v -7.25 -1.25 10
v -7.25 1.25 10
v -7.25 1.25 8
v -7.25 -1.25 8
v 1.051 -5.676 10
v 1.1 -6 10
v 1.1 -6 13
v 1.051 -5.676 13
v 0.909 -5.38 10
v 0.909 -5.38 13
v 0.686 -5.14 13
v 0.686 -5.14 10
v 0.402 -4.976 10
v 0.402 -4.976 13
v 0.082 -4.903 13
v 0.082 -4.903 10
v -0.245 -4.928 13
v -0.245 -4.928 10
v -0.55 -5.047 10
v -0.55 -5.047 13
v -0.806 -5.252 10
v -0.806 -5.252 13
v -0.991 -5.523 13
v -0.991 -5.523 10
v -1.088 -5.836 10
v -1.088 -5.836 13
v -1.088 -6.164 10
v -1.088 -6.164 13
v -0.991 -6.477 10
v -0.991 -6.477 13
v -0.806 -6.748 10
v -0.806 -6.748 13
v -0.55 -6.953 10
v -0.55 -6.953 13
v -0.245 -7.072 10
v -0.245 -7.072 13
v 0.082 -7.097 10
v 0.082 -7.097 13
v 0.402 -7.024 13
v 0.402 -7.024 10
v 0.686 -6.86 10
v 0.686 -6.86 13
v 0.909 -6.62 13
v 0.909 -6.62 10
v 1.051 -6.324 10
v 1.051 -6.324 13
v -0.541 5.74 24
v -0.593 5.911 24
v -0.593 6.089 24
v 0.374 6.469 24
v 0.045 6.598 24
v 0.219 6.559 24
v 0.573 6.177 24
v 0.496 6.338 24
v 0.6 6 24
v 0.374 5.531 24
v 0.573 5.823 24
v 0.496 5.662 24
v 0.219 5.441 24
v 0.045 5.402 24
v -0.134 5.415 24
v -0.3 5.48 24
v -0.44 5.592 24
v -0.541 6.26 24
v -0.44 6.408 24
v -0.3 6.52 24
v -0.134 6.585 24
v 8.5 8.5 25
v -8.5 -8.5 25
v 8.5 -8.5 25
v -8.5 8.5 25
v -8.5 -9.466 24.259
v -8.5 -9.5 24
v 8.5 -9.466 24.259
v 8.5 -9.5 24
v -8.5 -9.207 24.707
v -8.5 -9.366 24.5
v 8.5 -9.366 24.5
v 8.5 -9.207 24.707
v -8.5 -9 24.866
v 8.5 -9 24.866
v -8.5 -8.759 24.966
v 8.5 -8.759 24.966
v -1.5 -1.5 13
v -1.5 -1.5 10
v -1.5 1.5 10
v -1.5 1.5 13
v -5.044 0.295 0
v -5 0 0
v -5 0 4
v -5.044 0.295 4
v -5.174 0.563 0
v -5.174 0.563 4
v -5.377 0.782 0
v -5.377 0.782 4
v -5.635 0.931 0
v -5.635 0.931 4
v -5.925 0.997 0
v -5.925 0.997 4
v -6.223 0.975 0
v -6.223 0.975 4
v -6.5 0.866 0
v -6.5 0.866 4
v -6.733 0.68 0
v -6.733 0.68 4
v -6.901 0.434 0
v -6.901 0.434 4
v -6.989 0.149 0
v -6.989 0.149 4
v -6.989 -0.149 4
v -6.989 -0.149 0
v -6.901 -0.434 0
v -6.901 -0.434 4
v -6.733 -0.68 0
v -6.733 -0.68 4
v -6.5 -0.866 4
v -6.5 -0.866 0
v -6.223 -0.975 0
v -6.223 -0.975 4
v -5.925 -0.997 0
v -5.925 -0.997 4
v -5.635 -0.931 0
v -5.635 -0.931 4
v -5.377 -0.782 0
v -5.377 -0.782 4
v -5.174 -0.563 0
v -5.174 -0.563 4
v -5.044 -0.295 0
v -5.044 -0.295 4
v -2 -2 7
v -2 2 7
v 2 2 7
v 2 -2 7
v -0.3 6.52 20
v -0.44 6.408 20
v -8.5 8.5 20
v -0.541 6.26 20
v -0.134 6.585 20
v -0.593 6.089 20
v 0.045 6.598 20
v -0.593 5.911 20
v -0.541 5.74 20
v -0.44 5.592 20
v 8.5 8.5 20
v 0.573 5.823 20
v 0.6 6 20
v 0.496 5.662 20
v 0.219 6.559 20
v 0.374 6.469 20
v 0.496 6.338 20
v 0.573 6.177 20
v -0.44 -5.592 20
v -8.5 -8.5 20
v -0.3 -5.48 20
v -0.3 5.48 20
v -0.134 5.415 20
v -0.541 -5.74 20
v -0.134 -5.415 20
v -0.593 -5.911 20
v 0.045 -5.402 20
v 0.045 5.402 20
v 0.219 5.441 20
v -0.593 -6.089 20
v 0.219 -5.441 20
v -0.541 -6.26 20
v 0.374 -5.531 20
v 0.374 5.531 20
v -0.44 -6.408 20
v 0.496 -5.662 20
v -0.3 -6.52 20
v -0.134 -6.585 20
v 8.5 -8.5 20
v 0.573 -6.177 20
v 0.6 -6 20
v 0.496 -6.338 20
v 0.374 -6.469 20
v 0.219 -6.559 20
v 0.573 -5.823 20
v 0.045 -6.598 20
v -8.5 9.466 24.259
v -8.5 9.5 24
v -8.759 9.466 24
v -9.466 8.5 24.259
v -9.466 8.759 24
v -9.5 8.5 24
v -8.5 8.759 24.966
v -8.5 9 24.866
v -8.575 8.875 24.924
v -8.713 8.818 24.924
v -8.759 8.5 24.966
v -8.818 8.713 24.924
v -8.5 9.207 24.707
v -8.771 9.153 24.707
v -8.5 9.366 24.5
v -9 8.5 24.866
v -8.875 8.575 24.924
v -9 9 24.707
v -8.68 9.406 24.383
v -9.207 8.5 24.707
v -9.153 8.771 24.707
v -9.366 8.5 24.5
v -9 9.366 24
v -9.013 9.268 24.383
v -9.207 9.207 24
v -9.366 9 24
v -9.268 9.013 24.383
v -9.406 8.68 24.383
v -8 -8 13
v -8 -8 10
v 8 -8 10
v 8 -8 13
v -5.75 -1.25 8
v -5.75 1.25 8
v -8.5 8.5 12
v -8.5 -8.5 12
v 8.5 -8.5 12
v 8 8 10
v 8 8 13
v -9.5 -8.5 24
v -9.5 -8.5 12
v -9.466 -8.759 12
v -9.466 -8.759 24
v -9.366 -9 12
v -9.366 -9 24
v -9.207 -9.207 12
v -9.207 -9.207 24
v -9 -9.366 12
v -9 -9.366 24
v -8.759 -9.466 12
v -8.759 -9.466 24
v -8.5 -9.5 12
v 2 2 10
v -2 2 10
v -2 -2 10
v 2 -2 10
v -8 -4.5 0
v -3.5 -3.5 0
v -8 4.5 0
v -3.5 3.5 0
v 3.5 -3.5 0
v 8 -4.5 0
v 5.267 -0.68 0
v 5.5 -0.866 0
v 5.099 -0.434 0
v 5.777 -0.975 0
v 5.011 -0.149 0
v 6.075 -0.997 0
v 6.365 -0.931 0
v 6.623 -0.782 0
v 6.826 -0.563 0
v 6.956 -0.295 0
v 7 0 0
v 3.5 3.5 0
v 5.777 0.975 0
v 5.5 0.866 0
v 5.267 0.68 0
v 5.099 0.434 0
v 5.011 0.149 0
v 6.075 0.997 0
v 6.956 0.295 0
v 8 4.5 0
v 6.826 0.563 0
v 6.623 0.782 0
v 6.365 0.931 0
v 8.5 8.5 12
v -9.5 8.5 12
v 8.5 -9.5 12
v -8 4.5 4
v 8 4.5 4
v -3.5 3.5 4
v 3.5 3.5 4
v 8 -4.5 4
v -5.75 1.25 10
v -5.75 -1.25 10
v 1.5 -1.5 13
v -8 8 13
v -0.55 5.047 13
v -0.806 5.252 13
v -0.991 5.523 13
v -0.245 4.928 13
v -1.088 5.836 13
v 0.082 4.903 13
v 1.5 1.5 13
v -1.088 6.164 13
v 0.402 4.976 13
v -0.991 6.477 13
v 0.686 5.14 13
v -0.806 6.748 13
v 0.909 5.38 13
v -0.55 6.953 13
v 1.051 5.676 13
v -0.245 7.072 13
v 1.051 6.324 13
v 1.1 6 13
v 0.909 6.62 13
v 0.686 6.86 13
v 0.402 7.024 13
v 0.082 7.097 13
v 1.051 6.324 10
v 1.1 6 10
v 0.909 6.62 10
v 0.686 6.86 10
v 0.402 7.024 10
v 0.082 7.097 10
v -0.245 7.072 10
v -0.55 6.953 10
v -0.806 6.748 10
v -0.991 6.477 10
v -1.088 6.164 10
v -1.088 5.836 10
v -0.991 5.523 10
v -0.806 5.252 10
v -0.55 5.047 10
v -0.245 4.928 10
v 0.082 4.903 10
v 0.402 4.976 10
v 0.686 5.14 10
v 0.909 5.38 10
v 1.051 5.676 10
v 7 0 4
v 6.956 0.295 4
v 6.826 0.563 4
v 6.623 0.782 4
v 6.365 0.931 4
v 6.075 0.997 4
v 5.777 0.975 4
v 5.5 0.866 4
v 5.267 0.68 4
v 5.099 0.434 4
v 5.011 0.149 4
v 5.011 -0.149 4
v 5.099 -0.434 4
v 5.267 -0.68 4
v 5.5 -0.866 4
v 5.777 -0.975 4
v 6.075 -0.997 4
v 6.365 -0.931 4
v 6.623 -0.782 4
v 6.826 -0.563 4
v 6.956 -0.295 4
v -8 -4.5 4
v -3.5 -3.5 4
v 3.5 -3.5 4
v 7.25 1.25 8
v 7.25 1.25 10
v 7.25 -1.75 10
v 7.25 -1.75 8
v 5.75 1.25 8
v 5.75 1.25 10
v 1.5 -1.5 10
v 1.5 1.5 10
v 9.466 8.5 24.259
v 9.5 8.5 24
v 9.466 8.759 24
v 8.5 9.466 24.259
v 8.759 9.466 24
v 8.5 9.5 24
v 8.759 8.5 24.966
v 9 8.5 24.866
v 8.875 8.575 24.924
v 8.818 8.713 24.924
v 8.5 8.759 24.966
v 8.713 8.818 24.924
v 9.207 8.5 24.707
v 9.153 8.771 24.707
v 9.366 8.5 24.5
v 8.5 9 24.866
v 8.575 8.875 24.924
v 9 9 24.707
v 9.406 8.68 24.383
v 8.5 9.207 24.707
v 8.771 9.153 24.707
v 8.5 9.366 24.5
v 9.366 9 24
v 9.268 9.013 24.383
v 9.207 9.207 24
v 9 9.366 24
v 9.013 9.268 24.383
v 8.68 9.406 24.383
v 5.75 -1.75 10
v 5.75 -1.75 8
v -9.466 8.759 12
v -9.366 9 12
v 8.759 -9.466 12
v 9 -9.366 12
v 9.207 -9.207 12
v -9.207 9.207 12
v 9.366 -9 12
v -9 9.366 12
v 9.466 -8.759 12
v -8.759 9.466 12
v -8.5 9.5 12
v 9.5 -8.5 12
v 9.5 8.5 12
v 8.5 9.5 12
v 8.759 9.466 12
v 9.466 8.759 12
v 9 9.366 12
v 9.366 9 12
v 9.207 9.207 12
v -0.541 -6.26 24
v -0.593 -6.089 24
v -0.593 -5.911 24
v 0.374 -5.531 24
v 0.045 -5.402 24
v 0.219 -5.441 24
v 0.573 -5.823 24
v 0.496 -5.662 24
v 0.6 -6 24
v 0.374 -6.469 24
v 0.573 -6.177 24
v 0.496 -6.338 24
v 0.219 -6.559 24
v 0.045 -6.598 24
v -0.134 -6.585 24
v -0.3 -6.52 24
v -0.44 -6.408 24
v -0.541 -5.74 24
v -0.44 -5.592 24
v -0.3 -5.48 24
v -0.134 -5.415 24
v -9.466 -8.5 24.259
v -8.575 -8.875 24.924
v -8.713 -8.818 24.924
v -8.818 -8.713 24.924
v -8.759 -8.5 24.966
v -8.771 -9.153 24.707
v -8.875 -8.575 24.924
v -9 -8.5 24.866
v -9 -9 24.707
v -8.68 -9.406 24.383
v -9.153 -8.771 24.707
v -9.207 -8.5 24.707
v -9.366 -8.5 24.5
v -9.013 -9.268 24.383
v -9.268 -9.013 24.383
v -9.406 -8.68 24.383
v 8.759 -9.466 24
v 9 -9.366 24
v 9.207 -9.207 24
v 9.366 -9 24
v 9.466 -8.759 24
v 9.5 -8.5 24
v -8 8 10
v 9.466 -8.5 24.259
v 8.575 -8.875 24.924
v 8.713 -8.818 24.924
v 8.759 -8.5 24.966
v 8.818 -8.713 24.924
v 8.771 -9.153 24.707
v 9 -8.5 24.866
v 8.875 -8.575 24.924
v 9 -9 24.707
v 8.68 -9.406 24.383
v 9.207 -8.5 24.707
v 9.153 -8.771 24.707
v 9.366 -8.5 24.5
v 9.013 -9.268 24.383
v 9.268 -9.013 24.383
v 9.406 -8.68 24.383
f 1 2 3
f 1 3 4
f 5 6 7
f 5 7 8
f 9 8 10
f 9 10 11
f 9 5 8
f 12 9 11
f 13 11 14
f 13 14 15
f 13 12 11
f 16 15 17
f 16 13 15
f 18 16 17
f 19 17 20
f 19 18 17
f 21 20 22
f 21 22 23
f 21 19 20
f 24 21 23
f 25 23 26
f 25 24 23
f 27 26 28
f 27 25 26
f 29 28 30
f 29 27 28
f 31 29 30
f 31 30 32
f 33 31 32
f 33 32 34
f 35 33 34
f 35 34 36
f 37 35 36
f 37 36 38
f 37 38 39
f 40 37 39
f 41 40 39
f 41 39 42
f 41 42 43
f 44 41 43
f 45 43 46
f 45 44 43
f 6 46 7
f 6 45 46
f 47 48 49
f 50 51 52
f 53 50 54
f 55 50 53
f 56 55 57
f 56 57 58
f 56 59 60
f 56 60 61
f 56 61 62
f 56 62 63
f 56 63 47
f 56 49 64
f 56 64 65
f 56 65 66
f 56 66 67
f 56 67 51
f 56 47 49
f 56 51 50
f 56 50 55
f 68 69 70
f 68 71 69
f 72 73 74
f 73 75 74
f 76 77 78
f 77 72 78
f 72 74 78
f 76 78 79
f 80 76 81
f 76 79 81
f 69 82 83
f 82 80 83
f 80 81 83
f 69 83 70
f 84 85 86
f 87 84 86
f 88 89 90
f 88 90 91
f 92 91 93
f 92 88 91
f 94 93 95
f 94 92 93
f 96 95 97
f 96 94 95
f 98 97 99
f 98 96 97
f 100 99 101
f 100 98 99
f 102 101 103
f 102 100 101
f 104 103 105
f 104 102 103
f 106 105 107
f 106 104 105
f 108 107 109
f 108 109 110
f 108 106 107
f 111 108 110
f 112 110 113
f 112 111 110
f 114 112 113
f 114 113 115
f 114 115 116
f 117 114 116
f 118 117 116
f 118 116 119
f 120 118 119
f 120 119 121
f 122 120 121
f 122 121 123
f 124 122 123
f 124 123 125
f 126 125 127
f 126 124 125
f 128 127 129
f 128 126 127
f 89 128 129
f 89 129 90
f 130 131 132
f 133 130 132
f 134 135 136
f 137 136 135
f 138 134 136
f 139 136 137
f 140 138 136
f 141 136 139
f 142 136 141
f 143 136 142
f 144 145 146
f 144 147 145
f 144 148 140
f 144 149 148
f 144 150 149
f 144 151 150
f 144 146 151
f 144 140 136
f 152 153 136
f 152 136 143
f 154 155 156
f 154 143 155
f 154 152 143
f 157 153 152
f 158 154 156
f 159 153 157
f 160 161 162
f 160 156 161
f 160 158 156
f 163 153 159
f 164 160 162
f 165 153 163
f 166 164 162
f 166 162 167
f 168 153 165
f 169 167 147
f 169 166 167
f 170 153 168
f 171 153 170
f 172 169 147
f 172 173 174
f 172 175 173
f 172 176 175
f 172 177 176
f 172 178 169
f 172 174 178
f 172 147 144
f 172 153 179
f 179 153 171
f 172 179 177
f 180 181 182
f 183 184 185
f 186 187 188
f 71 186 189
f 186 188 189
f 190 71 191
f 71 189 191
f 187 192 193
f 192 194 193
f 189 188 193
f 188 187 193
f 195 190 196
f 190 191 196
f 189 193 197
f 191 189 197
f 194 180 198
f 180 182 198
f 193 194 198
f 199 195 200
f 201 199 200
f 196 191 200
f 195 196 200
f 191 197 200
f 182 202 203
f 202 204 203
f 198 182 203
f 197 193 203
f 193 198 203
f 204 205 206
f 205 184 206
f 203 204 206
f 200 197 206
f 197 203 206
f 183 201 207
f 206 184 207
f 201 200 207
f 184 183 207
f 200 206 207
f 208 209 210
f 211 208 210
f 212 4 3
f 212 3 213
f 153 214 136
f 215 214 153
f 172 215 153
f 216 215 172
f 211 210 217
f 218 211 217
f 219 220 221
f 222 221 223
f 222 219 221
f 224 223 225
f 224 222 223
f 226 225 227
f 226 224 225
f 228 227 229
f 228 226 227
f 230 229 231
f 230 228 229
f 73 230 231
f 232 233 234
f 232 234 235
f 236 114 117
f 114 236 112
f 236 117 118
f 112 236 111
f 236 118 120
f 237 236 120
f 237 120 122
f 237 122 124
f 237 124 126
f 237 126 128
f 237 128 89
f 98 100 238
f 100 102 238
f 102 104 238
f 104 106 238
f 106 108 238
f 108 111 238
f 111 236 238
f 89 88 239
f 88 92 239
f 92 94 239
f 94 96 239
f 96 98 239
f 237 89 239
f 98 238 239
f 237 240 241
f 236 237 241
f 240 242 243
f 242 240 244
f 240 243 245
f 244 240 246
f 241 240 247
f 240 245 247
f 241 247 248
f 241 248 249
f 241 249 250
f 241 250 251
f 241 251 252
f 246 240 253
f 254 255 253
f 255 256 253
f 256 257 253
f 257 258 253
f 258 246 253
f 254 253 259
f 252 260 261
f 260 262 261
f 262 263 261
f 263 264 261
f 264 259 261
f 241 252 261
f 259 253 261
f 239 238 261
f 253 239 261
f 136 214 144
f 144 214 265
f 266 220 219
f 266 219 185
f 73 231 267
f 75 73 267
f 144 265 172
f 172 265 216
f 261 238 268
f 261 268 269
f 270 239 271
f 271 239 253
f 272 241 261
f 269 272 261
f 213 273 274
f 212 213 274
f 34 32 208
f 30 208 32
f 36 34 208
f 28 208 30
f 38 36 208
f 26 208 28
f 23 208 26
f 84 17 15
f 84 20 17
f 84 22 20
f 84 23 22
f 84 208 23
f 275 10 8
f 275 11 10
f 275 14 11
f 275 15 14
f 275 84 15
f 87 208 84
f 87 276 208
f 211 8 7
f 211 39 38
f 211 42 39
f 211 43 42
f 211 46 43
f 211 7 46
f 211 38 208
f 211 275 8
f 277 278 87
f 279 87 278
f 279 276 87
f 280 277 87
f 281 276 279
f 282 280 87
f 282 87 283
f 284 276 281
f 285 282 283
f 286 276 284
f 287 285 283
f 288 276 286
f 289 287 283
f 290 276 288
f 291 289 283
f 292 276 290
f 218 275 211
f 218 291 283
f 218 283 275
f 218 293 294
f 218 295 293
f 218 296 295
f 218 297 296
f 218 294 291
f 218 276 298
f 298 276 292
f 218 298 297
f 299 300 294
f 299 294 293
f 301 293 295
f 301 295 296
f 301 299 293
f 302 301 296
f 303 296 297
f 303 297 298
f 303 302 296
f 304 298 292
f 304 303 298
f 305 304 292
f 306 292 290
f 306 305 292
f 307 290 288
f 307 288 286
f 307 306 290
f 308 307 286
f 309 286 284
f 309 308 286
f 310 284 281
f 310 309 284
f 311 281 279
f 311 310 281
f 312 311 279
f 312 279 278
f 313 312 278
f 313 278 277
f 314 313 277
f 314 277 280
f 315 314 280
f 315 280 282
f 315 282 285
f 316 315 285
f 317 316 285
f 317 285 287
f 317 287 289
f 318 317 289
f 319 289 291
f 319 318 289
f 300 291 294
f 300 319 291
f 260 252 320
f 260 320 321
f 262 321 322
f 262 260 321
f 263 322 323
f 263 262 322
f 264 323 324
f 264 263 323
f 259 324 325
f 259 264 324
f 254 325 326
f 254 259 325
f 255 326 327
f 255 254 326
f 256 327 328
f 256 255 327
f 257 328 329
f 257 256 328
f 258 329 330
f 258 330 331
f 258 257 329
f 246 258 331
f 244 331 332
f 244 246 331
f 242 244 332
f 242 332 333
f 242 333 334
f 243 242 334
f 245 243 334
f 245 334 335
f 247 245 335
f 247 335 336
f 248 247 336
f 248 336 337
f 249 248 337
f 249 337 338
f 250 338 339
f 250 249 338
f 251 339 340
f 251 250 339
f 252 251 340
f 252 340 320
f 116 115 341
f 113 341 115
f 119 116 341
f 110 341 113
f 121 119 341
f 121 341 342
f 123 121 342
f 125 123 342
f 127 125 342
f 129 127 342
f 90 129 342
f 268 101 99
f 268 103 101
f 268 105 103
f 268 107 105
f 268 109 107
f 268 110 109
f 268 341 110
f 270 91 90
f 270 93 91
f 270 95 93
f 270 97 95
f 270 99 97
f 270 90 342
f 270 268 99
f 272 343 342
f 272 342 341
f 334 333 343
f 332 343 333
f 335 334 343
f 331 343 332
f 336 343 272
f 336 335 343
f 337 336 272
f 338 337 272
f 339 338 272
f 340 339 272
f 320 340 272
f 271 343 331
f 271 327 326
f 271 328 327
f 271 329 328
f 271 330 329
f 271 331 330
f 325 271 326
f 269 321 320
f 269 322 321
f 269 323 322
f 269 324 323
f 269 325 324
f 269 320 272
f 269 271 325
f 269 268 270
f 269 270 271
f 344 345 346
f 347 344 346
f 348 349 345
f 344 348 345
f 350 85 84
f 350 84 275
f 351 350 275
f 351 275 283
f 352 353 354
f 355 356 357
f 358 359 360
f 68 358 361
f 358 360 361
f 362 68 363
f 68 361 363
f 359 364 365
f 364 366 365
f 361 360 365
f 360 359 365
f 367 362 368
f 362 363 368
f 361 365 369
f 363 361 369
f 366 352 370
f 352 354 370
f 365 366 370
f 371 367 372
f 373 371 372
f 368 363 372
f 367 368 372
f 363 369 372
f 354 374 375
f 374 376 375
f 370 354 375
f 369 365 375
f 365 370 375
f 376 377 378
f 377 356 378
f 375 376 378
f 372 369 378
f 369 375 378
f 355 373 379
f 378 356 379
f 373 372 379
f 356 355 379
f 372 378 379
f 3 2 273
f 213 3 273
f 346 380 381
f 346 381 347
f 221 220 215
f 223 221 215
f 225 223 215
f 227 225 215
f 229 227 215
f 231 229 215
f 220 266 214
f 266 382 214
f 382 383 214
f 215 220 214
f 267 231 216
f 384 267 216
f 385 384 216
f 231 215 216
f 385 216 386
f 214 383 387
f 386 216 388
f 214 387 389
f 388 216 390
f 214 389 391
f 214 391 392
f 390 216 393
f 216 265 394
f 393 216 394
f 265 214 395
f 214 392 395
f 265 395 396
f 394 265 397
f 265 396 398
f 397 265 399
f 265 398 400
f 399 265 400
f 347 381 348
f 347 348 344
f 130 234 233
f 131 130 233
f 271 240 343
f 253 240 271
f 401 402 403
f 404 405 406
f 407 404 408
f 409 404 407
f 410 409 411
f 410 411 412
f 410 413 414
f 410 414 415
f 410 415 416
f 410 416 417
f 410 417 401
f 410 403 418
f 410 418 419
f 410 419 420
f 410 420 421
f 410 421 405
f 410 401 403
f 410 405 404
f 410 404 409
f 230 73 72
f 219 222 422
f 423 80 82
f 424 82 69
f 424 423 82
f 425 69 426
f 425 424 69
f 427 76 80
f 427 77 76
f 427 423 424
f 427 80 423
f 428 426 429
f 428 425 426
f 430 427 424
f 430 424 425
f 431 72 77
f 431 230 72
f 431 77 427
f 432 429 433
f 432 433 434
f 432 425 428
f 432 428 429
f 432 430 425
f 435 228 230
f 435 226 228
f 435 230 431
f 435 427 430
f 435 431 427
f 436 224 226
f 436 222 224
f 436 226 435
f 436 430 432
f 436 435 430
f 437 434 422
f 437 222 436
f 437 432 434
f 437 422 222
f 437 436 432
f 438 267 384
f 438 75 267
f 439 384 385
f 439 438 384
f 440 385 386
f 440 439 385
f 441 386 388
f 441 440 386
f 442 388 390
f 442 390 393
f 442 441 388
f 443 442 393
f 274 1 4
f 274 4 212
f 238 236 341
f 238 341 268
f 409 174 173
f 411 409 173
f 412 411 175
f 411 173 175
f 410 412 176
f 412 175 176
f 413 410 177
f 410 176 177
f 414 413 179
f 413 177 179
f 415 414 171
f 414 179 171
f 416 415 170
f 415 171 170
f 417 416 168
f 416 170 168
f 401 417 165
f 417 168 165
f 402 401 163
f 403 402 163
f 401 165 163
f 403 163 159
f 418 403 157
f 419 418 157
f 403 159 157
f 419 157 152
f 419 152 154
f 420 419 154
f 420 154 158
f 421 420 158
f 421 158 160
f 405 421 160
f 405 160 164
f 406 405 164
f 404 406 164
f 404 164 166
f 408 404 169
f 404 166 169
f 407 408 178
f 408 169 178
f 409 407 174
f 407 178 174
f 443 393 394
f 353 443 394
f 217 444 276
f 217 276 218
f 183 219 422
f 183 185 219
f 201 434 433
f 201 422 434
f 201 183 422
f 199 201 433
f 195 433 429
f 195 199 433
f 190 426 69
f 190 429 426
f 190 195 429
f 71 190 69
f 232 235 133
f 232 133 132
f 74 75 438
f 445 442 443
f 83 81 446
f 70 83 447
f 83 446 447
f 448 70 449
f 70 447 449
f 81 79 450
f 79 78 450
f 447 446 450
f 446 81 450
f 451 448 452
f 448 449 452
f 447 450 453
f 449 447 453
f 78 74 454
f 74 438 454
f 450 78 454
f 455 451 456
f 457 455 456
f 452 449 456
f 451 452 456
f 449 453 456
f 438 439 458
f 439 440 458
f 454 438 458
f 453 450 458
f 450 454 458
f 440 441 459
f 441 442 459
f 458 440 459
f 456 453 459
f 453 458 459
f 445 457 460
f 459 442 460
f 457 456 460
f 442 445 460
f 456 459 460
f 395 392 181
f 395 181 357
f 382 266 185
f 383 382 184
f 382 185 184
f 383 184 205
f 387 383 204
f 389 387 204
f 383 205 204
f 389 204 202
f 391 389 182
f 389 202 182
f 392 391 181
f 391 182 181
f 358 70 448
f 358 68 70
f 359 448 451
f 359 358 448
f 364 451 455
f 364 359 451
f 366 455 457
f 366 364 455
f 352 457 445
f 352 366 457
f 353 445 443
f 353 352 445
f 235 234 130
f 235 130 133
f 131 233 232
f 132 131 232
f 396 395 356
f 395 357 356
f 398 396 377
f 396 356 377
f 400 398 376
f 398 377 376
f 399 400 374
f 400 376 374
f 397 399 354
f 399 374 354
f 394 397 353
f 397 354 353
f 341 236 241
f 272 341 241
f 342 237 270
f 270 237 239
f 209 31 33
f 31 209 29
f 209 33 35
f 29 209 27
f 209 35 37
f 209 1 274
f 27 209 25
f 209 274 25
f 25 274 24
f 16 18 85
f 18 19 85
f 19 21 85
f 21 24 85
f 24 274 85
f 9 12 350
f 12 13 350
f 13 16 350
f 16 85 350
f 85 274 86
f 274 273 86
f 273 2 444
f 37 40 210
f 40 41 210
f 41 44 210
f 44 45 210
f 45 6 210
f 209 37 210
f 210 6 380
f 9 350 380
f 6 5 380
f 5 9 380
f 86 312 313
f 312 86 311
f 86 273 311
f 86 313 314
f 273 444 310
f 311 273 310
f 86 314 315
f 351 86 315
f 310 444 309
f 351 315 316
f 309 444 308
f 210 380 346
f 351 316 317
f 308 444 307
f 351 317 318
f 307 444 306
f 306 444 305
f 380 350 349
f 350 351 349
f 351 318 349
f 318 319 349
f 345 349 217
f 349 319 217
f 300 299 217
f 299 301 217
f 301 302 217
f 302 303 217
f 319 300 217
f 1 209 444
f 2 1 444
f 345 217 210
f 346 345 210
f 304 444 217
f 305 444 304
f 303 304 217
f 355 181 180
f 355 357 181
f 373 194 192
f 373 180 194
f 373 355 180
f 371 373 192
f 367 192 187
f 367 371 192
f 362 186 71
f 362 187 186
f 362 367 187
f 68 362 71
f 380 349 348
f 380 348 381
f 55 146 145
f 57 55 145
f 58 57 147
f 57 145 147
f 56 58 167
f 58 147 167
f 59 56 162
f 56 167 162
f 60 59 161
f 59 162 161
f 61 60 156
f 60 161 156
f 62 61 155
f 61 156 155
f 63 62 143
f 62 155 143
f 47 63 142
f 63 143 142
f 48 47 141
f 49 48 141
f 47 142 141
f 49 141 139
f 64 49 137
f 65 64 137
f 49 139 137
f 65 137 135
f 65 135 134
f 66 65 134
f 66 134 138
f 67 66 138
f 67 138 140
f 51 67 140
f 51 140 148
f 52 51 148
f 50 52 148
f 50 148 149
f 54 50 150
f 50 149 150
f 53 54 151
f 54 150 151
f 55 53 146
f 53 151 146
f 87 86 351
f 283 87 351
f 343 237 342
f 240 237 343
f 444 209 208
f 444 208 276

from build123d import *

# Parameters (mm, degrees)
F0_W      = 16
F0_H      = 9
F0_R      = 1
F0_W_2    = 7
F0_H_2    = 7
F1_DEPTH  = 4
F3_W      = 4
F3_H      = 4
F4_DEPTH  = 3
F5_W      = 16
F5_H      = 16
F5_R      = 1.1
F5_W_2    = 3
F5_H_2    = 3
F6_DEPTH  = 3
F8_W      = 19
F8_H      = 19
F9_DEPTH  = 13
F10_W     = 17
F10_H     = 17
F11_DEPTH = 8
F12_R     = 0.6
F13_DEPTH = 4
F14_R     = 1
F15_W     = 1.5
F15_H     = 3
F15_H_2   = 2.5
F16_DEPTH = 2


with BuildPart() as f1:
    # F0 (on Top) → F1 (new body)
    with BuildSketch(Plane.XY):
        Rectangle(F0_W, F0_H)
        with Locations((-6, 0)):
            Circle(F0_R, mode=Mode.SUBTRACT)
        Rectangle(F0_W_2, F0_H_2, mode=Mode.SUBTRACT)
        with Locations((6, 0)):
            Circle(F0_R, mode=Mode.SUBTRACT)
    extrude(amount=F1_DEPTH)


with BuildPart() as f4:
    # F3 (on offset) → F4 (new body)
    with BuildSketch(Plane.XY.offset(10)):
        Rectangle(F3_W, F3_H)
    extrude(amount=-F4_DEPTH)


with BuildPart() as f6:
    # F5 (on offset) → F6 (new body)
    with BuildSketch(Plane.XY.offset(10)):
        Rectangle(F5_W, F5_H)
        with Locations((0, -6)):
            Circle(F5_R, mode=Mode.SUBTRACT)
        Rectangle(F5_W_2, F5_H_2, mode=Mode.SUBTRACT)
        with Locations((0, 6)):
            Circle(F5_R, mode=Mode.SUBTRACT)
    extrude(amount=F6_DEPTH)

    # F15 (on face) → F16 (join)
    with BuildSketch(Plane(origin=(0, 0, 10), x_dir=(1, 0, 0), z_dir=(0, 0, -1))):
        with Locations((6.5, 0.25)):
            Rectangle(F15_W, F15_H)
        with Locations((-6.5, 0)):
            Rectangle(F15_W, F15_H_2)
    extrude(amount=F16_DEPTH)


with BuildPart() as f9:
    # F8 (on offset) → F9 (new body)
    with BuildSketch(Plane.XY.offset(12)):
        Rectangle(F8_W, F8_H)
    extrude(amount=F9_DEPTH)

    # F10 (on face) → F11 (cut)
    with BuildSketch(Plane(origin=(0, 0, 12), x_dir=(1, 0, 0), z_dir=(0, 0, -1))):
        Rectangle(F10_W, F10_H)
    extrude(amount=-F11_DEPTH, mode=Mode.SUBTRACT)

    # F12 (on face) → F13 (cut)
    with BuildSketch(Plane(origin=(0, 0, 20), x_dir=(1, 0, 0), z_dir=(0, 0, -1))):
        with Locations((0, 6)):
            Circle(F12_R)
        with Locations((0, -6)):
            Circle(F12_R)
    extrude(amount=-F13_DEPTH, mode=Mode.SUBTRACT)

    # F14
    f14_edges = [f9.edges().sort_by_distance(p)[0] for p in [
        (-9.5, -9.5, 18.5),
        (9.5, -9.5, 18.5),
        (-9.5, 9.5, 18.5),
        (9.5, 9.5, 18.5),
        (0, -9.5, 25),
        (9.5, 0, 25),
        (0, 9.5, 25),
        (-9.5, 0, 25),
    ]]
    fillet(f14_edges, radius=F14_R)


solid = Compound([f1.part, f4.part, f6.part, f9.part])
